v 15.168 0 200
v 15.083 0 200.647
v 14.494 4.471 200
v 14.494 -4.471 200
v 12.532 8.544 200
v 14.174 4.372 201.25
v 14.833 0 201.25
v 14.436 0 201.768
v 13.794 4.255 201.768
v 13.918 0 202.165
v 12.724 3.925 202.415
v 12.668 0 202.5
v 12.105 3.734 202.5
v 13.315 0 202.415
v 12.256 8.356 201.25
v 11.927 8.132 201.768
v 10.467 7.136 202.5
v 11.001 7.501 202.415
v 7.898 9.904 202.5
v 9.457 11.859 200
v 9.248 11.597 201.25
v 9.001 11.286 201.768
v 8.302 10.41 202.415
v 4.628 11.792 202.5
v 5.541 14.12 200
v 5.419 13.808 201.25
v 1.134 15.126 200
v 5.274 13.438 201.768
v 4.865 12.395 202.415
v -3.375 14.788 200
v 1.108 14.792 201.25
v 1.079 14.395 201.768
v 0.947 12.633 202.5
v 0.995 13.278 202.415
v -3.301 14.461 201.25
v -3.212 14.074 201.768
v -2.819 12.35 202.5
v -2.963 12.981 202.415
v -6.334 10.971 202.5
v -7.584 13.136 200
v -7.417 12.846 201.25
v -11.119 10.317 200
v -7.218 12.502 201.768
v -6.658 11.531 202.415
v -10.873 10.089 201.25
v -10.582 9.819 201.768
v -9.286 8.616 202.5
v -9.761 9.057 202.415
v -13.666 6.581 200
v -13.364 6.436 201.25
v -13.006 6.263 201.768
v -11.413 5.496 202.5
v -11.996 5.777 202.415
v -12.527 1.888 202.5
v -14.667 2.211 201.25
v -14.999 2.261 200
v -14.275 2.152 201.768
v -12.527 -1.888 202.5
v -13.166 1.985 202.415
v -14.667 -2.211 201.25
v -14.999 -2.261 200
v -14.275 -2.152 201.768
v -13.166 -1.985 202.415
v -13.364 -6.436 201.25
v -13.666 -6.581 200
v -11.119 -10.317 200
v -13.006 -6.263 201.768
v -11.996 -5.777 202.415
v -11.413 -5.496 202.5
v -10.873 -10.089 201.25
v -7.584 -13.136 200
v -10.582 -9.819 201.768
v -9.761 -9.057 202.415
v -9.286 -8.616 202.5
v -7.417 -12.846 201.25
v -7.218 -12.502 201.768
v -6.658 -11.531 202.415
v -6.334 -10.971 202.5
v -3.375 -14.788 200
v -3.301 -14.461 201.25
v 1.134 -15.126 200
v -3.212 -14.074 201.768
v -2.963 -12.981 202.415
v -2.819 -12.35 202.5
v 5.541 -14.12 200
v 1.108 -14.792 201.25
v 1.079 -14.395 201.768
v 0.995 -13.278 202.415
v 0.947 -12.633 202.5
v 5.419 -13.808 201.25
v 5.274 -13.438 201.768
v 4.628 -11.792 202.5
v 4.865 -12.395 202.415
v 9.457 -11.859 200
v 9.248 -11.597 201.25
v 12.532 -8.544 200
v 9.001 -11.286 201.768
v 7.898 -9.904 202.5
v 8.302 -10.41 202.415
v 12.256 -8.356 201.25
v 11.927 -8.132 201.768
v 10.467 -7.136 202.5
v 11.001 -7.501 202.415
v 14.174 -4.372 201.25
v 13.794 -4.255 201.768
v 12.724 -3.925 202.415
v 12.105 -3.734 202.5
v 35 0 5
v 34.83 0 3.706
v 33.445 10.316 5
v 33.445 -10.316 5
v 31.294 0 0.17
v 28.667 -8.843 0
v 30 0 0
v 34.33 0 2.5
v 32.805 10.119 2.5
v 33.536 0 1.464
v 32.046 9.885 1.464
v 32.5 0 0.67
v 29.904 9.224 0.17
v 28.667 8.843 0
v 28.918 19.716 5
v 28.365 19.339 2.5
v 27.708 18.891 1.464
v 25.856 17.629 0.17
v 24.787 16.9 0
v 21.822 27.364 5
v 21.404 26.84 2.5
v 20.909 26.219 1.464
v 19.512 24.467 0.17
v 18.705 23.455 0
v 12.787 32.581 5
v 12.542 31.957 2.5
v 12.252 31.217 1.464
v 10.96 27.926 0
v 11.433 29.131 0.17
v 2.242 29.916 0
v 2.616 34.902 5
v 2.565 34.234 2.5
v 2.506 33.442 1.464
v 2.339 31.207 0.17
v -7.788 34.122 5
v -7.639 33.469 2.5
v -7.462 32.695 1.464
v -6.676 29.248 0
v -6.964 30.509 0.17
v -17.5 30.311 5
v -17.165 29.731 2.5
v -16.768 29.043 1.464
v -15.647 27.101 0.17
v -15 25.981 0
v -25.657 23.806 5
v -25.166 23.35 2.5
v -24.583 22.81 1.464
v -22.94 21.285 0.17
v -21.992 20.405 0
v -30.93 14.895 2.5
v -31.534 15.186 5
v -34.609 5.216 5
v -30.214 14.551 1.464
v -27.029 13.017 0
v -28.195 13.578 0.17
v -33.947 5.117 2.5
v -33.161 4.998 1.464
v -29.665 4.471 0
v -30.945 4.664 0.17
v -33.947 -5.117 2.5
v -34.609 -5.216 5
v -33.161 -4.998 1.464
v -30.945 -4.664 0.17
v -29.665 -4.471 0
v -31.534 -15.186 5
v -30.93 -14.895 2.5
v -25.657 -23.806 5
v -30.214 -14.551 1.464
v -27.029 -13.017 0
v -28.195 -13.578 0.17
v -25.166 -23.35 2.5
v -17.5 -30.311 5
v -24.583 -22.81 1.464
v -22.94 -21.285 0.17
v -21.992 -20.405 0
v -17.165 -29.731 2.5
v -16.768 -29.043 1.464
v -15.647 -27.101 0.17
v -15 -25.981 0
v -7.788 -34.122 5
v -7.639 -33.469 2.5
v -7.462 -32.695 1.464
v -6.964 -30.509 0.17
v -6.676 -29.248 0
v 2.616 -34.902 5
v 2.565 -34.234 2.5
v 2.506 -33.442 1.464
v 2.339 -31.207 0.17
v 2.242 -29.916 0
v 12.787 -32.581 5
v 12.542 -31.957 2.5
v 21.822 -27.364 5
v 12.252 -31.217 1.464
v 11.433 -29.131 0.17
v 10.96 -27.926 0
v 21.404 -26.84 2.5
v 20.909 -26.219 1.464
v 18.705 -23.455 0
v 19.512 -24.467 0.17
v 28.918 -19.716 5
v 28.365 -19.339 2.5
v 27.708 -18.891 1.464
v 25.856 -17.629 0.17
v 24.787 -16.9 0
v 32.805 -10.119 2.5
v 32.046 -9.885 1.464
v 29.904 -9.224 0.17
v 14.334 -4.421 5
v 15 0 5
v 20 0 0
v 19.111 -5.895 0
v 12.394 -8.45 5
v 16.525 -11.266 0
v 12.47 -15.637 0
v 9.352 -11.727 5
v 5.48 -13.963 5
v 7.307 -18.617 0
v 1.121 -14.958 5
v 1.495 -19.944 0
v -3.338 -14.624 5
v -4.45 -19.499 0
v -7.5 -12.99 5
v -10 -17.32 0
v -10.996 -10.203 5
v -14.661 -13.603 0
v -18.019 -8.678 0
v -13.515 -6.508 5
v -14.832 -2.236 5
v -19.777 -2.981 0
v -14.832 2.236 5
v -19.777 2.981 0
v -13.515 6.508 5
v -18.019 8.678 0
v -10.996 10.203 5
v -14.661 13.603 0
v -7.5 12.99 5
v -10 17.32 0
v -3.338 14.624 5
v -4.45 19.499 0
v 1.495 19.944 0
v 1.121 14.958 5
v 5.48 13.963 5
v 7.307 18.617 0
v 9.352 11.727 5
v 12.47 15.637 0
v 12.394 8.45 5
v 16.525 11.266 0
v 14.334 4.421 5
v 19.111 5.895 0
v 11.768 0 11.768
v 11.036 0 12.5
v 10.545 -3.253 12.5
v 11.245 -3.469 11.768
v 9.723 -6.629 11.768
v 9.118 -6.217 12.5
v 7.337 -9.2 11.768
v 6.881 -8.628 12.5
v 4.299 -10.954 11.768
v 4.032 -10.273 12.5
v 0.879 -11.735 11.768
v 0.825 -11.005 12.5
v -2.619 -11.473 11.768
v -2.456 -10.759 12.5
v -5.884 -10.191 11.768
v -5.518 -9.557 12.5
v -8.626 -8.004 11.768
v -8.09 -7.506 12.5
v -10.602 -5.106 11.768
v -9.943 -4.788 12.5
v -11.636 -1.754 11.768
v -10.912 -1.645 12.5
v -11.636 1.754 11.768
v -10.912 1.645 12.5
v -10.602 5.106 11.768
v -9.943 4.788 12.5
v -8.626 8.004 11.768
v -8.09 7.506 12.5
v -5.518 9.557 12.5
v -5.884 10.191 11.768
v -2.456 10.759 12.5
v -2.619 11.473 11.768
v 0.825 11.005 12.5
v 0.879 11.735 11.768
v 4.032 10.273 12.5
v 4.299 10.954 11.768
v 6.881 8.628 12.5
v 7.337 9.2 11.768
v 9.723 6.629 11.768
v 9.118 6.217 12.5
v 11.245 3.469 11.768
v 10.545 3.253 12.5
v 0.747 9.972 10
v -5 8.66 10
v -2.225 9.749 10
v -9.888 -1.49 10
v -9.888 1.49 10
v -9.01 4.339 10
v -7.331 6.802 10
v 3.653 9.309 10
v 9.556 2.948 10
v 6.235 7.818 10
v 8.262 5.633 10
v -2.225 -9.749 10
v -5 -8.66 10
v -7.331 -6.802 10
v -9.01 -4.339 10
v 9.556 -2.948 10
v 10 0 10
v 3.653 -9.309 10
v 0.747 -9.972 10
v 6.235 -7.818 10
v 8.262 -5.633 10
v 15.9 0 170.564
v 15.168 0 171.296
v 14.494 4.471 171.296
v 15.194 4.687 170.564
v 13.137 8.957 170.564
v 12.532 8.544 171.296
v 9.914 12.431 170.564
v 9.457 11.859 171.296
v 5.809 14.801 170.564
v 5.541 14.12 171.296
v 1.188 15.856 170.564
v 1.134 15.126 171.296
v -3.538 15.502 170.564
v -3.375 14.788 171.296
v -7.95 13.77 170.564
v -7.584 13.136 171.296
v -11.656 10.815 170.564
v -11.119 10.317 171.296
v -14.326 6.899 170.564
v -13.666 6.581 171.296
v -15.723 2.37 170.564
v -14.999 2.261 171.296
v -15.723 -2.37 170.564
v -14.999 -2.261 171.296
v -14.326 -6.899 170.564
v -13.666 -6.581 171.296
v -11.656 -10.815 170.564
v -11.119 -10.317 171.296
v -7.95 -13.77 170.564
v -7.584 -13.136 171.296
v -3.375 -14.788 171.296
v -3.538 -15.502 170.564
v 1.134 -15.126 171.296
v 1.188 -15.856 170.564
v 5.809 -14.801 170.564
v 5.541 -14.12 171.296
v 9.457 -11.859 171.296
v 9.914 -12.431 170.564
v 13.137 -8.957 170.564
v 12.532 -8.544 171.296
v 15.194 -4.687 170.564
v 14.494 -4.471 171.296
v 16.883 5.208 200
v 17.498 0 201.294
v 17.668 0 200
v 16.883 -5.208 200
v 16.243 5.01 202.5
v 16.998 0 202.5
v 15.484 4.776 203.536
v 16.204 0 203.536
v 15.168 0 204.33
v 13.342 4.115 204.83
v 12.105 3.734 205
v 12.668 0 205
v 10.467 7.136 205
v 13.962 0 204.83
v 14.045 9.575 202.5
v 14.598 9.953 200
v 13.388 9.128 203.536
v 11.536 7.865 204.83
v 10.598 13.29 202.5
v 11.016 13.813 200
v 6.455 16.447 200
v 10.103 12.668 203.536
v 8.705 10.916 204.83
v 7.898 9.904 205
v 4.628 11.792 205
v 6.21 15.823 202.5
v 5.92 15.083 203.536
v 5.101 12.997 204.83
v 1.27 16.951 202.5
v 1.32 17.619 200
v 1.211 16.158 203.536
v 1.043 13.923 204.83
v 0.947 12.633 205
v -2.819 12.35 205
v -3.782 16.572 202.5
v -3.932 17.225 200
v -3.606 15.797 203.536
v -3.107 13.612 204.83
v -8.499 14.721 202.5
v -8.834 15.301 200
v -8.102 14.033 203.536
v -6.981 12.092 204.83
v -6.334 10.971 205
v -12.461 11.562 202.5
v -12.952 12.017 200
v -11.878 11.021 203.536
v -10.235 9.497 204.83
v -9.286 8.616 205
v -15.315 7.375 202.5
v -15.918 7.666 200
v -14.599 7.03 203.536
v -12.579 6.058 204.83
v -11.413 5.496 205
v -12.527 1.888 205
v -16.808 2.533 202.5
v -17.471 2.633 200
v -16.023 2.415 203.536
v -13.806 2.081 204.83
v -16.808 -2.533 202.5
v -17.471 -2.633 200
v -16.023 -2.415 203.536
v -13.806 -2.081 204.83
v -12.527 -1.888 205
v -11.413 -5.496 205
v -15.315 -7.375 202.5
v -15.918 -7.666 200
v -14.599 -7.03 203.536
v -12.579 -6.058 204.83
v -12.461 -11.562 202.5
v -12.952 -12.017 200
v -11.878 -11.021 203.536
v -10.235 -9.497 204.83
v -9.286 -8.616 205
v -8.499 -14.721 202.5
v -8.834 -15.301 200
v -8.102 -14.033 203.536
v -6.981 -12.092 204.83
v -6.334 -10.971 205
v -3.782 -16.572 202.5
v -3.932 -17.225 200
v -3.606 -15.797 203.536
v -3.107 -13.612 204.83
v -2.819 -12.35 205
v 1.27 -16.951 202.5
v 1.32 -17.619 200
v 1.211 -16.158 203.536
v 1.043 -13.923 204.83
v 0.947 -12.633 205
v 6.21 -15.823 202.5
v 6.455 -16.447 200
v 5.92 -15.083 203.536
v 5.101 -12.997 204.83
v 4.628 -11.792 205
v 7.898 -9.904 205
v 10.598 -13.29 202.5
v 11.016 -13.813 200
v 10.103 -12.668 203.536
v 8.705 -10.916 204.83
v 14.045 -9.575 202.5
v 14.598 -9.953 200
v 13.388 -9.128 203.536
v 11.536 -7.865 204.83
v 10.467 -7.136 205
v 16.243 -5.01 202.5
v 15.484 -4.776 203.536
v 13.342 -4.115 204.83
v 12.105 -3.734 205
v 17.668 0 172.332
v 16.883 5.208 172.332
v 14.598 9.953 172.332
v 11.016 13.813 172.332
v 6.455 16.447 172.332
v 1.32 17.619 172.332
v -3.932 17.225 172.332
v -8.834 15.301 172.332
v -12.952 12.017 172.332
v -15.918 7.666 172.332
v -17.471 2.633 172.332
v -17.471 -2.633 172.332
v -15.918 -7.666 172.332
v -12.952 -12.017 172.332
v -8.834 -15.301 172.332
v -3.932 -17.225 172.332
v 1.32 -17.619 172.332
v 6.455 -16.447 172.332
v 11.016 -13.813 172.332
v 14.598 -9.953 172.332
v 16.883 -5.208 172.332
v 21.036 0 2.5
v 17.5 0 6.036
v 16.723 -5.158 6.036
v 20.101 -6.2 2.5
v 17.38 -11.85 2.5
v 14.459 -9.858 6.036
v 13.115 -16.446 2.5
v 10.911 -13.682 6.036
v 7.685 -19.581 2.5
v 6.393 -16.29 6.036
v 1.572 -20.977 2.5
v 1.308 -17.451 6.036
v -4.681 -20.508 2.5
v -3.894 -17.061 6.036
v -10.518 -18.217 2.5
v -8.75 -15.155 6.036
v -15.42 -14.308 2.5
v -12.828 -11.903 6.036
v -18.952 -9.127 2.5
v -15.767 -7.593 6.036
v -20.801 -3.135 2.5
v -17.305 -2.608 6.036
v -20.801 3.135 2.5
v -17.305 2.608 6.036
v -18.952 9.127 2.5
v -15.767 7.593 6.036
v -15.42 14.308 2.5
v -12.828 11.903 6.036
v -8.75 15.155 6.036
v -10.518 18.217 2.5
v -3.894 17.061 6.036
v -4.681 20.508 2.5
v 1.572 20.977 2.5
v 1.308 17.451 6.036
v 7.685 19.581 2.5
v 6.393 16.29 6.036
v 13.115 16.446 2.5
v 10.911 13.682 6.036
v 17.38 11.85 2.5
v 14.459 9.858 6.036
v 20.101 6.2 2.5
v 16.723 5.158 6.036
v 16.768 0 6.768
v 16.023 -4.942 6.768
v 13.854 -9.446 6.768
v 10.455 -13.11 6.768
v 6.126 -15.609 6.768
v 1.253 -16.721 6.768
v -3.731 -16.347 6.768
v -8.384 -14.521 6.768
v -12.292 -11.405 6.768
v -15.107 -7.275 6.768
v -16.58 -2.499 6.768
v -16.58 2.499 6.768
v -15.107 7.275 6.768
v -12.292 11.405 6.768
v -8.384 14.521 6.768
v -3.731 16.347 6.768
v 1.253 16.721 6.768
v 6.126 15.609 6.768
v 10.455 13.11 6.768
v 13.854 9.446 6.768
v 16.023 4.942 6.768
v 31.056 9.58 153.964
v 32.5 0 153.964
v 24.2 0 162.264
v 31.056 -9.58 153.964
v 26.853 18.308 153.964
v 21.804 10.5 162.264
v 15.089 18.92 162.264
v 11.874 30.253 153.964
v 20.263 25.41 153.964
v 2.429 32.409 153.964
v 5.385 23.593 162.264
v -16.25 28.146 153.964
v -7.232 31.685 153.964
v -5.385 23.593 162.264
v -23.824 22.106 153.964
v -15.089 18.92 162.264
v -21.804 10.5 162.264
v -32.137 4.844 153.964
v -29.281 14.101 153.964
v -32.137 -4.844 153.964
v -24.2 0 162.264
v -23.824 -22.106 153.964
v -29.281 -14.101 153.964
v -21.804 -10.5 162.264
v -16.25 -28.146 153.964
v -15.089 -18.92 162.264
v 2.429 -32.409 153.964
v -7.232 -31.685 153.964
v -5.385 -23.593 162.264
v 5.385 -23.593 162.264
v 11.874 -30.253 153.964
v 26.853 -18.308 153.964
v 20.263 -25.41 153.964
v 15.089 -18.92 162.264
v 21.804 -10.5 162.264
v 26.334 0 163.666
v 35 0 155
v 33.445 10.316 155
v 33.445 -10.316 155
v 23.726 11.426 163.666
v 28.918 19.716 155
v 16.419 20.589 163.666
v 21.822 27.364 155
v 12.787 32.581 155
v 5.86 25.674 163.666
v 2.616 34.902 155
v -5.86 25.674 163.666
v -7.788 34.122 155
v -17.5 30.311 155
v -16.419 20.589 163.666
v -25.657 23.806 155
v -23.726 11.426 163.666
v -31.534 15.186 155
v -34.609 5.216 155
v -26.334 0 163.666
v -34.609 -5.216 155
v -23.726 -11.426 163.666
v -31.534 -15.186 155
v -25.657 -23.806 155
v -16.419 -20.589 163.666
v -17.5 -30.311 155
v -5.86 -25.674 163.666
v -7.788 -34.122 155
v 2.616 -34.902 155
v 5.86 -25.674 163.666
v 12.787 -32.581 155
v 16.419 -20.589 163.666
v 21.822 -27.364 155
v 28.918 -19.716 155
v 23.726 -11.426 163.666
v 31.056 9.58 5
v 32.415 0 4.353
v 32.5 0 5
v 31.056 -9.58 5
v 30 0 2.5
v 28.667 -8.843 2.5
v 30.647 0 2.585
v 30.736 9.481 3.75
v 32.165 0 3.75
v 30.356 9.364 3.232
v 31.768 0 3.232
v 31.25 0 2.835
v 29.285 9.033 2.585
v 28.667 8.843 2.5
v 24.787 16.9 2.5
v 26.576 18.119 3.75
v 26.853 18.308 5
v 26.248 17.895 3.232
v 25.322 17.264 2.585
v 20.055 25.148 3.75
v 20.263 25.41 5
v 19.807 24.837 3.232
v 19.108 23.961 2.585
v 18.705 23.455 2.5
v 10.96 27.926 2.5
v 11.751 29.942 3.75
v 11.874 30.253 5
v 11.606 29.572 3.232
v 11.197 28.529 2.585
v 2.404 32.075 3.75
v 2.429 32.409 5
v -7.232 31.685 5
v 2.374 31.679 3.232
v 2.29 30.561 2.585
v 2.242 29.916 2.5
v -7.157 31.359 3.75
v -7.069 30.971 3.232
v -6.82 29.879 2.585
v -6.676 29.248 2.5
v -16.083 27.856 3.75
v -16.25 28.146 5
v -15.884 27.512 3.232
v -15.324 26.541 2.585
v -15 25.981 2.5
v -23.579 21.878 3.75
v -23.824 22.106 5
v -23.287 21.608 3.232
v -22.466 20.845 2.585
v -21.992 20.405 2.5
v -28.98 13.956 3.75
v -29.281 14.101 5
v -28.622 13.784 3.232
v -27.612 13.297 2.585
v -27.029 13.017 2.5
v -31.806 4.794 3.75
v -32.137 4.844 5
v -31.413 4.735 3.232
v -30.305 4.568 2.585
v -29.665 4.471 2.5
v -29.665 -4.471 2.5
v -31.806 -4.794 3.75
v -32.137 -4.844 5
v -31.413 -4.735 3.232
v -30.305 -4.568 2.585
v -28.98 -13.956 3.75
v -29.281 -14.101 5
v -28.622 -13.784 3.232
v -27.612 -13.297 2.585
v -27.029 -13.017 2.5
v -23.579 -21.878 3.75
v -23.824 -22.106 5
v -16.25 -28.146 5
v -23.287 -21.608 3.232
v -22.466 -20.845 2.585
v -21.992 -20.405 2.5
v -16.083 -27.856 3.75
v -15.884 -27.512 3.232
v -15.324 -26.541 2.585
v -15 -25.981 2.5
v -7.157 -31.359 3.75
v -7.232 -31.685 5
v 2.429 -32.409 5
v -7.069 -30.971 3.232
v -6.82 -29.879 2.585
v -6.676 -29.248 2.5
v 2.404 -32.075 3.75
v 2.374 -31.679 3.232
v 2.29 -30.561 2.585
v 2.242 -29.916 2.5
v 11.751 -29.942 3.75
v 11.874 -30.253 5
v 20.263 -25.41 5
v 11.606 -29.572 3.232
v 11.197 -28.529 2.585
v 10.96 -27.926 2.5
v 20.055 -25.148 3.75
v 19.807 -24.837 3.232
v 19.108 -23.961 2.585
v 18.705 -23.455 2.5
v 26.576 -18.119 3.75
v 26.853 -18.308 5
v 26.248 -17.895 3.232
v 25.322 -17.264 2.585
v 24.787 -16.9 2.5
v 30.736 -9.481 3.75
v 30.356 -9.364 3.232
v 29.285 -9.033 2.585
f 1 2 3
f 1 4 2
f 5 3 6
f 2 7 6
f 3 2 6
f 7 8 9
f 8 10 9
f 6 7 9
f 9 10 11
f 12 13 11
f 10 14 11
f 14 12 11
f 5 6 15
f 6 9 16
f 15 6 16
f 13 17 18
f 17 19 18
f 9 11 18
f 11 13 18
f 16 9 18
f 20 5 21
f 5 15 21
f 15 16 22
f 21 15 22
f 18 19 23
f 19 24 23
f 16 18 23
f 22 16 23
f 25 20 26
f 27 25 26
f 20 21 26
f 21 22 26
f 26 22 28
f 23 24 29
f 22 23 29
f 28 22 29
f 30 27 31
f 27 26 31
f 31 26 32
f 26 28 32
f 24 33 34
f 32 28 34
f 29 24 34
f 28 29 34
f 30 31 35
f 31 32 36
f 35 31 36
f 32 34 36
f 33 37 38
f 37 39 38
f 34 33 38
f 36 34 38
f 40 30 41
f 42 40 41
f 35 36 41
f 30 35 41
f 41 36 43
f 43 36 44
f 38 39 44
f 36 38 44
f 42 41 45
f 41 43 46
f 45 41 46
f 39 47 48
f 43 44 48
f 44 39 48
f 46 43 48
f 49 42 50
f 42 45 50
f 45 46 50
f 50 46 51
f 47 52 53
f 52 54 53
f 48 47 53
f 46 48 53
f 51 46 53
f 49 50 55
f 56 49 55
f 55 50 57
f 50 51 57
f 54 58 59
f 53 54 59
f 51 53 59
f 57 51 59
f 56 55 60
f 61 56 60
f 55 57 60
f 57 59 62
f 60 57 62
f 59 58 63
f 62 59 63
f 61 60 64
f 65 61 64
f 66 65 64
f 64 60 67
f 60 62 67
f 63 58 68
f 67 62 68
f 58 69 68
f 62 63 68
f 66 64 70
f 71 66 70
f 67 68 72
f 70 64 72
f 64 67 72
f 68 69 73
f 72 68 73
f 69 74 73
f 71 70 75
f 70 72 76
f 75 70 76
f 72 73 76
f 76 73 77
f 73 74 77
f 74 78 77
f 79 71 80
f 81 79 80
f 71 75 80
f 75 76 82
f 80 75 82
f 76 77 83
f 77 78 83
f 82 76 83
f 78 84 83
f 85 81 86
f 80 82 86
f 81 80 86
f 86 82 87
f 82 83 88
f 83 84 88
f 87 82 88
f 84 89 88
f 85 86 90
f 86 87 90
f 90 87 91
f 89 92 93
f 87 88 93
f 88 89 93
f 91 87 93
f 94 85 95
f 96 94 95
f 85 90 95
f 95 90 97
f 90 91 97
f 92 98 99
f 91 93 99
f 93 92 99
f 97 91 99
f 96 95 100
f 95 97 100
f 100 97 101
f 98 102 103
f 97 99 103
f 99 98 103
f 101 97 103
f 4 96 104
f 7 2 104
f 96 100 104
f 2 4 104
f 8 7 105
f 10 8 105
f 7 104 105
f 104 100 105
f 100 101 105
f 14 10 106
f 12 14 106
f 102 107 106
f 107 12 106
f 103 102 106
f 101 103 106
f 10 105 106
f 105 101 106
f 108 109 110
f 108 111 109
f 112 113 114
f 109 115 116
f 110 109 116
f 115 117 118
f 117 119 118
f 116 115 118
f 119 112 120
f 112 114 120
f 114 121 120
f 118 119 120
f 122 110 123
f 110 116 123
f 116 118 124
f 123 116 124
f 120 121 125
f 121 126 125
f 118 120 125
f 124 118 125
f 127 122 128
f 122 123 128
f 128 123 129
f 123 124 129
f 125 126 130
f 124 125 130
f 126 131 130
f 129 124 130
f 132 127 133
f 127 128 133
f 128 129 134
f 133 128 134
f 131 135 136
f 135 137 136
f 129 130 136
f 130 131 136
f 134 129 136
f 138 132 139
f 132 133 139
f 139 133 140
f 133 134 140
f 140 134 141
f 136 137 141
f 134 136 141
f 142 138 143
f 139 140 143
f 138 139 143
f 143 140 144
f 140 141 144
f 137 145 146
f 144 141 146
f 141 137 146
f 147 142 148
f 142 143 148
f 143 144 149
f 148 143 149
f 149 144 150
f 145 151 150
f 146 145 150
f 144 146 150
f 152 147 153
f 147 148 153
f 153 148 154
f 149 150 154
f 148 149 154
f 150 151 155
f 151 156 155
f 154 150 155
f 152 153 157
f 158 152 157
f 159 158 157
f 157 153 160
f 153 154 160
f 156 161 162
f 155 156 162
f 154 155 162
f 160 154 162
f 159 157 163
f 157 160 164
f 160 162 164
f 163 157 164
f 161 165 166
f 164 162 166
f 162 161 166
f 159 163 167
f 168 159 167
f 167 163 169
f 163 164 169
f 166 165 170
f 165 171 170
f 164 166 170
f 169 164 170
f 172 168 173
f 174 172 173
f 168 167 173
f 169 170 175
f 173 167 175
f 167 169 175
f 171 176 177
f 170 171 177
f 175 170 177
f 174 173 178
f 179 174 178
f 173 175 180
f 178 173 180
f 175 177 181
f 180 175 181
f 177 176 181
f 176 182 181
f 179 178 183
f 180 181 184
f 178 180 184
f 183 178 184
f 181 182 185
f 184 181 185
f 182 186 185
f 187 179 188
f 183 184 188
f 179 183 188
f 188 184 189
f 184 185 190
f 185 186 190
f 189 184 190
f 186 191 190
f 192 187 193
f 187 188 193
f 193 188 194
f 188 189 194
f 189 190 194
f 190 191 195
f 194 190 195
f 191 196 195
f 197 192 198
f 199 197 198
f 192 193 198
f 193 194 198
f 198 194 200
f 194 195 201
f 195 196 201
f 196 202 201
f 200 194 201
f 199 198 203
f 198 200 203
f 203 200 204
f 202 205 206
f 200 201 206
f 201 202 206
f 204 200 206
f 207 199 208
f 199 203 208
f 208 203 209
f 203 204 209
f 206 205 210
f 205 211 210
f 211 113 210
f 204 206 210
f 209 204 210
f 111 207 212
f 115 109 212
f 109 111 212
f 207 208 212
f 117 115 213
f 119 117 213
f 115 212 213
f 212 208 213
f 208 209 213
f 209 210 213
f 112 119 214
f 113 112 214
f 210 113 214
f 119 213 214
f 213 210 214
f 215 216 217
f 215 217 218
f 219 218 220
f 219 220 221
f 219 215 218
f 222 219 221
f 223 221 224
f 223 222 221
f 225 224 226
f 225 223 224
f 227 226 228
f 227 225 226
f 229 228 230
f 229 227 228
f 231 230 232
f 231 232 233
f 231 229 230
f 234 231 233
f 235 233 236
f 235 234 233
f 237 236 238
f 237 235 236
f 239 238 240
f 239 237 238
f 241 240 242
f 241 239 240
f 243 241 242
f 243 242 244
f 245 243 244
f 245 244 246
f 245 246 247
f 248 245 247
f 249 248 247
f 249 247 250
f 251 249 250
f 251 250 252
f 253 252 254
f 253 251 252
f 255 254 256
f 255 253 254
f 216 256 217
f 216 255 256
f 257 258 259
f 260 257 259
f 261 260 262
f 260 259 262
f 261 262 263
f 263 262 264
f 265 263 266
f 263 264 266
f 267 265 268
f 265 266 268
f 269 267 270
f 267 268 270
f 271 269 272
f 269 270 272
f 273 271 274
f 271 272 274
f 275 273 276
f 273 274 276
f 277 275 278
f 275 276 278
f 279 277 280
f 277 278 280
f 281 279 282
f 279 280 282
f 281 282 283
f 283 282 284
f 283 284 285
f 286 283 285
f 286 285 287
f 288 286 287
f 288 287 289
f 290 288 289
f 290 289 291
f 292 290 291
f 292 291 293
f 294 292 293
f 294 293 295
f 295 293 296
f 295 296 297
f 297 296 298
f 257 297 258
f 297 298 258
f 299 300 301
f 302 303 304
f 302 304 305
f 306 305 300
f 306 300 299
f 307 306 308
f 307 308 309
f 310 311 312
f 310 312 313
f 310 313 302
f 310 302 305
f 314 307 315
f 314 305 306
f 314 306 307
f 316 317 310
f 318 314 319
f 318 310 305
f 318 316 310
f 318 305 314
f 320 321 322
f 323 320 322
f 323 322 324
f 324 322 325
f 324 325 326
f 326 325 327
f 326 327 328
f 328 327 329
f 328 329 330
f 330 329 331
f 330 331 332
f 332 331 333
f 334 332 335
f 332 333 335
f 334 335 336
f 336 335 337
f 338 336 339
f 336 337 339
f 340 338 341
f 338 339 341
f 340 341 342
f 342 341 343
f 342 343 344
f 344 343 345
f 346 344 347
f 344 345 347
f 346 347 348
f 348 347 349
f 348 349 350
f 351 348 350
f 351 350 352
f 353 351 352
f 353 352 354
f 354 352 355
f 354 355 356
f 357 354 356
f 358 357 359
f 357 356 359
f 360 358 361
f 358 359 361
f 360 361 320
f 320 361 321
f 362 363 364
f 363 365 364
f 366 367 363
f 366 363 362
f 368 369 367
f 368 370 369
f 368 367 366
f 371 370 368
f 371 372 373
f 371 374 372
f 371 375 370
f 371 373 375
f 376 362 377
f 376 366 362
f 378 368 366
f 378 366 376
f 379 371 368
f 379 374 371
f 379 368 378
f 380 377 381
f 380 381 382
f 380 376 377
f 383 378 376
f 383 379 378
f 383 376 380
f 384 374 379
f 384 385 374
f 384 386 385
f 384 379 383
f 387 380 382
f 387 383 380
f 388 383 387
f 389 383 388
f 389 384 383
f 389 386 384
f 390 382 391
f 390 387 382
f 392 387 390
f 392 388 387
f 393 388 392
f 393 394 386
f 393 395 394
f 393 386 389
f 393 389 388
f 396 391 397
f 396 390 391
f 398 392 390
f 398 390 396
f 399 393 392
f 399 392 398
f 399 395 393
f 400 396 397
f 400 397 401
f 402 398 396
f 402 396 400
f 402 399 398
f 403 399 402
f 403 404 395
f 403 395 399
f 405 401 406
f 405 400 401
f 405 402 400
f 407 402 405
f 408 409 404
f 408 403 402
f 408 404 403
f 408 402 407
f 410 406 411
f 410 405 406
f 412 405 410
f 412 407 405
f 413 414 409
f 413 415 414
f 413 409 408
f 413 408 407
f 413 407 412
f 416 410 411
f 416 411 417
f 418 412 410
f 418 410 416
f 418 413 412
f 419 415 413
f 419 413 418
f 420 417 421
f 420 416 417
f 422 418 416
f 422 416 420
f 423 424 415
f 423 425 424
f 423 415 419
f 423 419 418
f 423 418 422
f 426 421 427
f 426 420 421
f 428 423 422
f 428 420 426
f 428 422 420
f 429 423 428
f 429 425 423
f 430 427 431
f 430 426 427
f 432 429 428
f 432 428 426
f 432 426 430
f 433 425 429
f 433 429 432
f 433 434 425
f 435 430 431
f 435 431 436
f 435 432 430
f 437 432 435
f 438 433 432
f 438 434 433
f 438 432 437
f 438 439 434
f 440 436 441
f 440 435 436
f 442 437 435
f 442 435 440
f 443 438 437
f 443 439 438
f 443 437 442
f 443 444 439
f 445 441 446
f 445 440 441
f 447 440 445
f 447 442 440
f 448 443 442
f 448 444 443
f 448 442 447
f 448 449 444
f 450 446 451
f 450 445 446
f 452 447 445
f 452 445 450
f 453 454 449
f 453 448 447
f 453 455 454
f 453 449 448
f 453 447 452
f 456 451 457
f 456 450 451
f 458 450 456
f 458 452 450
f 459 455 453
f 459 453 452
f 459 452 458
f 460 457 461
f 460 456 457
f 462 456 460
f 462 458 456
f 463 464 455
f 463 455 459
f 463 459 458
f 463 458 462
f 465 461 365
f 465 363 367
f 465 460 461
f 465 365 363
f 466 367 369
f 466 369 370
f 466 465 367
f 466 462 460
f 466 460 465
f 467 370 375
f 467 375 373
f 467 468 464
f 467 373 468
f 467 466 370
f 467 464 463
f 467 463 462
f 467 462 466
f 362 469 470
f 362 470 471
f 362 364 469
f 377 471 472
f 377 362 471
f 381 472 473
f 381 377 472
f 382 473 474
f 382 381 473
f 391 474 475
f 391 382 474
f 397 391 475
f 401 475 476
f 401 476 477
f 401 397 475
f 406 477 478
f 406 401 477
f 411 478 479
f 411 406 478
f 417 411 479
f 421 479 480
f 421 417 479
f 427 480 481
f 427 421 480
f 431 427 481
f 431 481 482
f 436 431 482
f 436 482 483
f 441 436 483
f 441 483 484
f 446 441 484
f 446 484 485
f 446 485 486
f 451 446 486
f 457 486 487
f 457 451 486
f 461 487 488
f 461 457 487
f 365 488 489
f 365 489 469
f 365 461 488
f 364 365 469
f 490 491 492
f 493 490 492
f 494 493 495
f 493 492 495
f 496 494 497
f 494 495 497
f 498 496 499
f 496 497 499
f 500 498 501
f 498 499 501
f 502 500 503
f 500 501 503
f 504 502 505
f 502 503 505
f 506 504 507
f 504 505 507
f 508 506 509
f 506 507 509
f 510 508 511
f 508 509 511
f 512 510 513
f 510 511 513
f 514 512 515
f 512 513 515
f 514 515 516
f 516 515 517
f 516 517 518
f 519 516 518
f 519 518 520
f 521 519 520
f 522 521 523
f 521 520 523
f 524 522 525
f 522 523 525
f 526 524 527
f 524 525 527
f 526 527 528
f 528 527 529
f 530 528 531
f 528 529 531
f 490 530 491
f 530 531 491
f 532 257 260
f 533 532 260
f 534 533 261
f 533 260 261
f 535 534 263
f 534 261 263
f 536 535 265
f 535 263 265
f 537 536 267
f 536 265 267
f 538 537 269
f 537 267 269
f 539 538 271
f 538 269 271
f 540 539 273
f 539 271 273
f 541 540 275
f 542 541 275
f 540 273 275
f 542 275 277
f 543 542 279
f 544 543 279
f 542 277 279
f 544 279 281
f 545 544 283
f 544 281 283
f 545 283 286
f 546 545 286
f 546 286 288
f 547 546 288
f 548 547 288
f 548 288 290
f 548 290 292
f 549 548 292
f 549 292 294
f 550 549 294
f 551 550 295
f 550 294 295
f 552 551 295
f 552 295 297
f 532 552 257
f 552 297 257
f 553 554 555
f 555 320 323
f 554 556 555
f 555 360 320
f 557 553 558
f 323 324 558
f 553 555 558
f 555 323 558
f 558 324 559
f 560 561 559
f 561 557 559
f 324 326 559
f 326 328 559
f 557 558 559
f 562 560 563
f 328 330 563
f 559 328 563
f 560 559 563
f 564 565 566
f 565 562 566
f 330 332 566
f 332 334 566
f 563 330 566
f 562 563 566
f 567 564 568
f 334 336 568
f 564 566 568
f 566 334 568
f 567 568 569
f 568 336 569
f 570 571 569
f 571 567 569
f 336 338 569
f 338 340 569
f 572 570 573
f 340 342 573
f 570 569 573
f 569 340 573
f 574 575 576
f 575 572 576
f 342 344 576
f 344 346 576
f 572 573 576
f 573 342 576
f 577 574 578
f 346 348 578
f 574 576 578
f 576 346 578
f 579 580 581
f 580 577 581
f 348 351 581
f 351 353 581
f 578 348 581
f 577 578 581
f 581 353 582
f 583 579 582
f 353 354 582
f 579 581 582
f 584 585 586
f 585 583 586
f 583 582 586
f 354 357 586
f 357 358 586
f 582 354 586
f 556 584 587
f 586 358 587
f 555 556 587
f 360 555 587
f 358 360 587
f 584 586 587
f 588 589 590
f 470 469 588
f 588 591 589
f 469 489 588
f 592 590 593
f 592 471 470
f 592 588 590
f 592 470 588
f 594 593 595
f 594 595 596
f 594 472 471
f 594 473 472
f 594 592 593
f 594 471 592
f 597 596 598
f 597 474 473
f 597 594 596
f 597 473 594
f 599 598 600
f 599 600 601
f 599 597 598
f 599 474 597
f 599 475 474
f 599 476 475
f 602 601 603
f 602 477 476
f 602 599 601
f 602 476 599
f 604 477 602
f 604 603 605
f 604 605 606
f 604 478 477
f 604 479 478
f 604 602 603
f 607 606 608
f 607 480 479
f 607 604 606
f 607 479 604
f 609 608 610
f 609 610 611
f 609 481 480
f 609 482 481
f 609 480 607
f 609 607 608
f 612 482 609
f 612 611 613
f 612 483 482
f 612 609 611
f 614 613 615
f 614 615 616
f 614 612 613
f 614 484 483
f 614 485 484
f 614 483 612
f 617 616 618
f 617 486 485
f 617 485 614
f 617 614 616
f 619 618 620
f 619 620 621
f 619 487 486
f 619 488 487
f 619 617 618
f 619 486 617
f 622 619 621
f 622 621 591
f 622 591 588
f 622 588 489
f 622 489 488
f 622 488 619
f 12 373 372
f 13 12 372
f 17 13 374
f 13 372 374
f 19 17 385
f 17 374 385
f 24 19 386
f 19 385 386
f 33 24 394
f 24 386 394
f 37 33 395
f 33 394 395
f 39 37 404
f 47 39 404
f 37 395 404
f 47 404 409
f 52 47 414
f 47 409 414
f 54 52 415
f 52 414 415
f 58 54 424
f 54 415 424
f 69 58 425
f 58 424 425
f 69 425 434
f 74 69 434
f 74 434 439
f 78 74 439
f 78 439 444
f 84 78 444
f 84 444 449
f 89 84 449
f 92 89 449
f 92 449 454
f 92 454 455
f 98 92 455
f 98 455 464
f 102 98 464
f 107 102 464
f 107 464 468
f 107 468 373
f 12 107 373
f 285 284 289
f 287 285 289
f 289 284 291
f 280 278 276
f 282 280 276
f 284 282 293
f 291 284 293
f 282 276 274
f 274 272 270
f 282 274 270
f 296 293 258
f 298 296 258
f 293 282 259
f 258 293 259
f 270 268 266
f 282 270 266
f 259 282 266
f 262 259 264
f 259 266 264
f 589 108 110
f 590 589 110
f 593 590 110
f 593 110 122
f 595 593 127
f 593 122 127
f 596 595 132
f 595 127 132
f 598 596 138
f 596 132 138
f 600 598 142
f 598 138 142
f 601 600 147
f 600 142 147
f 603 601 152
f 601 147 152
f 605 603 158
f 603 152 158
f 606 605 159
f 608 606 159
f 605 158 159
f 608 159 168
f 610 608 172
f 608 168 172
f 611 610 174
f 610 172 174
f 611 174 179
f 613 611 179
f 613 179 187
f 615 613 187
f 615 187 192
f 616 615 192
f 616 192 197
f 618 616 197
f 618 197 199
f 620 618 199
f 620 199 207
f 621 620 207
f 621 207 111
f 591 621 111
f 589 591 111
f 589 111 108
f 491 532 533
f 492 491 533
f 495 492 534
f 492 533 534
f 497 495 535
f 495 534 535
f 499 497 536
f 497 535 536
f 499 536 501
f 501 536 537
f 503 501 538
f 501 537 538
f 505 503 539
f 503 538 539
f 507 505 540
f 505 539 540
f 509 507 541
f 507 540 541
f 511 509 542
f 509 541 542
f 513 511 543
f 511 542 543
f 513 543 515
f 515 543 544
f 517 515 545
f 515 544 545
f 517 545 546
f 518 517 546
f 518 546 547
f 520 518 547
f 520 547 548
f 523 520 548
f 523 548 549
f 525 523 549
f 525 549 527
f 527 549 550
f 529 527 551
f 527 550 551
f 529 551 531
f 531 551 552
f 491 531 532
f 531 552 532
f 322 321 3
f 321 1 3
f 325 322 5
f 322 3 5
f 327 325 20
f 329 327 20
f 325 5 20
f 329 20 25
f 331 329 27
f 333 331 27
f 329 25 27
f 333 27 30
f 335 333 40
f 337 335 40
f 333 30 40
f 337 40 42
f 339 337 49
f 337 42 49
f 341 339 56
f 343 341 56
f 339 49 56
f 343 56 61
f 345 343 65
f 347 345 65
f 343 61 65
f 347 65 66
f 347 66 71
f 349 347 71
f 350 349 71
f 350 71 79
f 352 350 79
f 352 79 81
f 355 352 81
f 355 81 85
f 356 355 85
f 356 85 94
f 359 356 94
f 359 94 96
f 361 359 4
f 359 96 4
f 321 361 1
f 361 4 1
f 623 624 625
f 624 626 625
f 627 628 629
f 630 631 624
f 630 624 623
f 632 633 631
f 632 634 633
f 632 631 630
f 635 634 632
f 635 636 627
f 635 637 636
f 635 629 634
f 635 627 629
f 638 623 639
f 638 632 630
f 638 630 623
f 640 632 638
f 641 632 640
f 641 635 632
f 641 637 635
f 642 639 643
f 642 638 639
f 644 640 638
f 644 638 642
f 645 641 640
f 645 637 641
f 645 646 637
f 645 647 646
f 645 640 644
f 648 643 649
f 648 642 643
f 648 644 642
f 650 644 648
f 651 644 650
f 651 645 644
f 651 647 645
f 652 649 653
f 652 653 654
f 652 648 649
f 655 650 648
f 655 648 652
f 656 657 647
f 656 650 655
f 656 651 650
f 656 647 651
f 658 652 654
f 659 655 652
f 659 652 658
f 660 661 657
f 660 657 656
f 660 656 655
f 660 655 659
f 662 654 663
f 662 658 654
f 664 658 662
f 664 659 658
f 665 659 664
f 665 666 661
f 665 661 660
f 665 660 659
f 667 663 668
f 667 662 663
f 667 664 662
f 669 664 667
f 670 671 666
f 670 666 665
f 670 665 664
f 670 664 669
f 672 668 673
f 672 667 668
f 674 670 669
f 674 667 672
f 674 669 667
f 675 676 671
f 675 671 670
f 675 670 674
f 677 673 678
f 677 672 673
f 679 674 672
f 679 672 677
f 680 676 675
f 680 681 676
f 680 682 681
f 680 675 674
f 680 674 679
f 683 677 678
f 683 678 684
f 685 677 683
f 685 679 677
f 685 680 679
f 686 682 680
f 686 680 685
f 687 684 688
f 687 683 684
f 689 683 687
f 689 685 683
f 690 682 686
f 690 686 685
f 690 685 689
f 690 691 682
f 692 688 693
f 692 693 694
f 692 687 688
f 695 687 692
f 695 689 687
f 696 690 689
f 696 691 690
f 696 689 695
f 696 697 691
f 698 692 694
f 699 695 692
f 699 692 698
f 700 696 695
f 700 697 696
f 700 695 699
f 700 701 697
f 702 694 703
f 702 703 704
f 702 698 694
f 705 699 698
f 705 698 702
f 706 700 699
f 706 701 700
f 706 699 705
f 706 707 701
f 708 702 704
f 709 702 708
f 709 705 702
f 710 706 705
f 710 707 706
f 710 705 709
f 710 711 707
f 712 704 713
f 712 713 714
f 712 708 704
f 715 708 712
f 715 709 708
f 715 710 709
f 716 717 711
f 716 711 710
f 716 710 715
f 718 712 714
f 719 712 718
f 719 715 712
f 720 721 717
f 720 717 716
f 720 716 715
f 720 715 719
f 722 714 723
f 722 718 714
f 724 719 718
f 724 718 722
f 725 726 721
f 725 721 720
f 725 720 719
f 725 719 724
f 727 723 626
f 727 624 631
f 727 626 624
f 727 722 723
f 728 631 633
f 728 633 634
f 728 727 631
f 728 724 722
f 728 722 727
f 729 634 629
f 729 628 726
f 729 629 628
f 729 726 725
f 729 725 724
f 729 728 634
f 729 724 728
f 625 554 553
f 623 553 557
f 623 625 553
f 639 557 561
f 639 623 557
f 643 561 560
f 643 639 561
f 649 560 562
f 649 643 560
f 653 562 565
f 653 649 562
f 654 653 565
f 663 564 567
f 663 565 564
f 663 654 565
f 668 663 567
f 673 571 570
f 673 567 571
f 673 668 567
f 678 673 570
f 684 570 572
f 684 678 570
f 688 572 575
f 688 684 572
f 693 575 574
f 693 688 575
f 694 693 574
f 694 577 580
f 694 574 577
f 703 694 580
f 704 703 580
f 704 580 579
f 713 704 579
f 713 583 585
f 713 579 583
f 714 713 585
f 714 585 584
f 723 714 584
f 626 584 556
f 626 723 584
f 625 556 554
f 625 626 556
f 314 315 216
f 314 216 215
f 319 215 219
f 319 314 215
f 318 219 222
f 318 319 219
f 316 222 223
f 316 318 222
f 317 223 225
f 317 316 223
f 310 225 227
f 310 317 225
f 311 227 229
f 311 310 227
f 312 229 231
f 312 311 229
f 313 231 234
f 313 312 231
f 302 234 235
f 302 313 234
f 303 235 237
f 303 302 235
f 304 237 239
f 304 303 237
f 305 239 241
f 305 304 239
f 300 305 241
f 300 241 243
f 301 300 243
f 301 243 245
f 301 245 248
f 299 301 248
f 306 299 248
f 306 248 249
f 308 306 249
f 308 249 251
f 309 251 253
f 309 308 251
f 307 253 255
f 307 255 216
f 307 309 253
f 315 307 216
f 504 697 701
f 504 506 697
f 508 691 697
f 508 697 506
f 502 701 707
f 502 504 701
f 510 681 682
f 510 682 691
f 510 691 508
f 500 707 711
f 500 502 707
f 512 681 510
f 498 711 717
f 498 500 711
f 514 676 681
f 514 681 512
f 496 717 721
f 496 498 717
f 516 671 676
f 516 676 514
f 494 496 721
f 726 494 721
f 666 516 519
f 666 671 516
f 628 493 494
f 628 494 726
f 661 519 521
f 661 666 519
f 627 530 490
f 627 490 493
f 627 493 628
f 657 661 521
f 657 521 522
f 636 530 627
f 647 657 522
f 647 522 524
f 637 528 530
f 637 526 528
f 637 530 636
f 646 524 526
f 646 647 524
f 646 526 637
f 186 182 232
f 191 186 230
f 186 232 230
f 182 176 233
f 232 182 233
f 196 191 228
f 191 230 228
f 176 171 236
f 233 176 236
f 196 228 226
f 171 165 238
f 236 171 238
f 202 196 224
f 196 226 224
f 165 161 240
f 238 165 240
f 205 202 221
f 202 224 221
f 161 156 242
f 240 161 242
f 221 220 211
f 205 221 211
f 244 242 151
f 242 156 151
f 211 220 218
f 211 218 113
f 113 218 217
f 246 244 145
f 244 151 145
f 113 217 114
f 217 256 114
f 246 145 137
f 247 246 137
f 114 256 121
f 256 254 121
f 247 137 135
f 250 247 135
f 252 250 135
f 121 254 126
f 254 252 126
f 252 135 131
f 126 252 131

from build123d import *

# Parameters (mm, degrees)
F0_R        = 35
F1_DEPTH    = 180
F2_R        = 15
F3_DEPTH    = 10
F4_SIZE     = 4.99999
F5_R        = 17.6680128579
F6_DEPTH    = 25
F7_R        = 5
F8_R        = 5
F9_S5_R     = 17.6680128579
F9_T6_DEPTH = 53
F10_T       = 2.5


# Not quite as in the source:
# - a fillet or chamfer that OpenCascade refuses, or shapes differently, is made with other operations: its cross-section is extruded or revolved along the edge and cut away or added
# - a fillet or chamfer is up to 0.001 mm smaller than in the source, because OpenCascade refuses the exact size
# - a shell that OpenCascade refuses in one call is made with other operations: the cavity is built on its own and cut out


with BuildPart() as f1:
    # F0 (on Top) → F1 (new body)
    with BuildSketch(Plane.XY):
        Circle(F0_R)
    extrude(amount=F1_DEPTH)

    # F2 (on face) → F3 (cut)
    with BuildSketch(Plane(origin=(0, 0, 0), x_dir=(1, 0, 0), z_dir=(0, 0, -1))):
        Circle(F2_R)
    extrude(amount=-F3_DEPTH, mode=Mode.SUBTRACT)

    # F4 (size 5 in the source; OpenCascade refuses exactly that, so slightly less here)
    f4_edges = [f1.edges().sort_by_distance(p)[0] for p in [
        (-15, 0, 10),
        (-15, 0, 0),
    ]]
    chamfer(f4_edges, length=F4_SIZE)

    # F5 (on face) → F6 (join)
    with BuildSketch(Plane.XY.offset(180)):
        Circle(F5_R)
    extrude(amount=F6_DEPTH)

    # F7
    f7_edges = [f1.edges().sort_by_distance(p)[0] for p in [
        (-17.668013, 0, 205),
    ]]
    fillet(f7_edges, radius=F7_R)

    # F8
    f8_edges = [f1.edges().sort_by_distance(p)[0] for p in [
        (-35, 0, 0),
    ]]
    fillet(f8_edges, radius=F8_R)

    # F9: chamfer of 25 on 1 edges, made by hand


with BuildPart() as f9_tool2:
    # F9_s3 → F9_t4 (revolve)
    with BuildSketch(Plane.XZ):
        Polygon((35, 155), (10, 180), (35, 180), align=None)
    revolve(axis=Axis((0, 0, 180), (0, 0, 1)))

    # F9_s5 → F9_t6 (cut, symmetric)
    with BuildSketch(Plane.XY.offset(167.5)):
        Circle(F9_S5_R)
    extrude(amount=F9_T6_DEPTH, both=True, mode=Mode.SUBTRACT)


with BuildPart() as f1_1:
    add(f1.part)

    # F9_t1: cut F9_tool2
    add(f9_tool2.part, mode=Mode.SUBTRACT)

    # F10: shell of thickness 2.5, made by hand


with BuildPart() as f10_core1:
    # F10_t2: copy of F1
    add(f1_1.part)

    # the walls: a layer under each face that stays
    f10_faces = [f10_core1.faces().sort_by_distance(p)[0] for p in [
        (-35, 0, 80),
        (-26.334006429, 0, 163.665993571),
        (-17.6680128579, 0, 186.165993571),
        (-16.2035467638, 0, 203.5355339059),
        (-33.5355339059, 0, 1.4644660941),
        (-20, -20, 0),
        (-17.499995, 0, 2.499995),
        (-15, 0, 5),
        (-12.500005, 0, 7.500005),
        (0, 0, 10),
    ]]
    thicken(f10_faces, amount=-F10_T, mode=Mode.SUBTRACT)

    # F10_s3 → F10_t4 (revolve, cut)
    with BuildSketch(Plane.XZ):
        Polygon((17.7106905274, 172.3496648116), (15.9002459049, 170.5642201891), (15.1680128579, 171.2964532362), (15.1680128579, 172.3319871421), align=None)
    revolve(axis=Axis((0, 0, 172.3319871421), (0, 0, 1)), mode=Mode.SUBTRACT)

    # F10_s5 → F10_t6 (revolve, cut)
    with BuildSketch(Plane.XZ):
        Polygon((14.9573223305, 4.9823323305), (17.5, 5.00001), (17.5, 6.0355439059), (16.767766953, 6.767776953), align=None)
    revolve(axis=Axis((0, 0, 5.00001), (0, 0, -1)), mode=Mode.SUBTRACT)

    # F10_s7 → F10_t8 (revolve, cut)
    with BuildSketch(Plane.XZ):
        Polygon((9.9823323305, 9.9573223305), (11.767776953, 11.767766953), (11.0355439059, 12.5), (10.00001, 12.5), align=None)
    revolve(axis=Axis((0, 0, 10), (0, 0, -1)), mode=Mode.SUBTRACT)


with BuildPart() as f1_2:
    add(f1_1.part)

    # what is left inside the walls is the cavity
    f10_cavity = [f10_core1.part.solids().sort_by_distance(p)[0] for p in [
        (-32.475, 0, 104.309644),
    ]]
    add(f10_cavity, mode=Mode.SUBTRACT)


solid = f1_2.part
